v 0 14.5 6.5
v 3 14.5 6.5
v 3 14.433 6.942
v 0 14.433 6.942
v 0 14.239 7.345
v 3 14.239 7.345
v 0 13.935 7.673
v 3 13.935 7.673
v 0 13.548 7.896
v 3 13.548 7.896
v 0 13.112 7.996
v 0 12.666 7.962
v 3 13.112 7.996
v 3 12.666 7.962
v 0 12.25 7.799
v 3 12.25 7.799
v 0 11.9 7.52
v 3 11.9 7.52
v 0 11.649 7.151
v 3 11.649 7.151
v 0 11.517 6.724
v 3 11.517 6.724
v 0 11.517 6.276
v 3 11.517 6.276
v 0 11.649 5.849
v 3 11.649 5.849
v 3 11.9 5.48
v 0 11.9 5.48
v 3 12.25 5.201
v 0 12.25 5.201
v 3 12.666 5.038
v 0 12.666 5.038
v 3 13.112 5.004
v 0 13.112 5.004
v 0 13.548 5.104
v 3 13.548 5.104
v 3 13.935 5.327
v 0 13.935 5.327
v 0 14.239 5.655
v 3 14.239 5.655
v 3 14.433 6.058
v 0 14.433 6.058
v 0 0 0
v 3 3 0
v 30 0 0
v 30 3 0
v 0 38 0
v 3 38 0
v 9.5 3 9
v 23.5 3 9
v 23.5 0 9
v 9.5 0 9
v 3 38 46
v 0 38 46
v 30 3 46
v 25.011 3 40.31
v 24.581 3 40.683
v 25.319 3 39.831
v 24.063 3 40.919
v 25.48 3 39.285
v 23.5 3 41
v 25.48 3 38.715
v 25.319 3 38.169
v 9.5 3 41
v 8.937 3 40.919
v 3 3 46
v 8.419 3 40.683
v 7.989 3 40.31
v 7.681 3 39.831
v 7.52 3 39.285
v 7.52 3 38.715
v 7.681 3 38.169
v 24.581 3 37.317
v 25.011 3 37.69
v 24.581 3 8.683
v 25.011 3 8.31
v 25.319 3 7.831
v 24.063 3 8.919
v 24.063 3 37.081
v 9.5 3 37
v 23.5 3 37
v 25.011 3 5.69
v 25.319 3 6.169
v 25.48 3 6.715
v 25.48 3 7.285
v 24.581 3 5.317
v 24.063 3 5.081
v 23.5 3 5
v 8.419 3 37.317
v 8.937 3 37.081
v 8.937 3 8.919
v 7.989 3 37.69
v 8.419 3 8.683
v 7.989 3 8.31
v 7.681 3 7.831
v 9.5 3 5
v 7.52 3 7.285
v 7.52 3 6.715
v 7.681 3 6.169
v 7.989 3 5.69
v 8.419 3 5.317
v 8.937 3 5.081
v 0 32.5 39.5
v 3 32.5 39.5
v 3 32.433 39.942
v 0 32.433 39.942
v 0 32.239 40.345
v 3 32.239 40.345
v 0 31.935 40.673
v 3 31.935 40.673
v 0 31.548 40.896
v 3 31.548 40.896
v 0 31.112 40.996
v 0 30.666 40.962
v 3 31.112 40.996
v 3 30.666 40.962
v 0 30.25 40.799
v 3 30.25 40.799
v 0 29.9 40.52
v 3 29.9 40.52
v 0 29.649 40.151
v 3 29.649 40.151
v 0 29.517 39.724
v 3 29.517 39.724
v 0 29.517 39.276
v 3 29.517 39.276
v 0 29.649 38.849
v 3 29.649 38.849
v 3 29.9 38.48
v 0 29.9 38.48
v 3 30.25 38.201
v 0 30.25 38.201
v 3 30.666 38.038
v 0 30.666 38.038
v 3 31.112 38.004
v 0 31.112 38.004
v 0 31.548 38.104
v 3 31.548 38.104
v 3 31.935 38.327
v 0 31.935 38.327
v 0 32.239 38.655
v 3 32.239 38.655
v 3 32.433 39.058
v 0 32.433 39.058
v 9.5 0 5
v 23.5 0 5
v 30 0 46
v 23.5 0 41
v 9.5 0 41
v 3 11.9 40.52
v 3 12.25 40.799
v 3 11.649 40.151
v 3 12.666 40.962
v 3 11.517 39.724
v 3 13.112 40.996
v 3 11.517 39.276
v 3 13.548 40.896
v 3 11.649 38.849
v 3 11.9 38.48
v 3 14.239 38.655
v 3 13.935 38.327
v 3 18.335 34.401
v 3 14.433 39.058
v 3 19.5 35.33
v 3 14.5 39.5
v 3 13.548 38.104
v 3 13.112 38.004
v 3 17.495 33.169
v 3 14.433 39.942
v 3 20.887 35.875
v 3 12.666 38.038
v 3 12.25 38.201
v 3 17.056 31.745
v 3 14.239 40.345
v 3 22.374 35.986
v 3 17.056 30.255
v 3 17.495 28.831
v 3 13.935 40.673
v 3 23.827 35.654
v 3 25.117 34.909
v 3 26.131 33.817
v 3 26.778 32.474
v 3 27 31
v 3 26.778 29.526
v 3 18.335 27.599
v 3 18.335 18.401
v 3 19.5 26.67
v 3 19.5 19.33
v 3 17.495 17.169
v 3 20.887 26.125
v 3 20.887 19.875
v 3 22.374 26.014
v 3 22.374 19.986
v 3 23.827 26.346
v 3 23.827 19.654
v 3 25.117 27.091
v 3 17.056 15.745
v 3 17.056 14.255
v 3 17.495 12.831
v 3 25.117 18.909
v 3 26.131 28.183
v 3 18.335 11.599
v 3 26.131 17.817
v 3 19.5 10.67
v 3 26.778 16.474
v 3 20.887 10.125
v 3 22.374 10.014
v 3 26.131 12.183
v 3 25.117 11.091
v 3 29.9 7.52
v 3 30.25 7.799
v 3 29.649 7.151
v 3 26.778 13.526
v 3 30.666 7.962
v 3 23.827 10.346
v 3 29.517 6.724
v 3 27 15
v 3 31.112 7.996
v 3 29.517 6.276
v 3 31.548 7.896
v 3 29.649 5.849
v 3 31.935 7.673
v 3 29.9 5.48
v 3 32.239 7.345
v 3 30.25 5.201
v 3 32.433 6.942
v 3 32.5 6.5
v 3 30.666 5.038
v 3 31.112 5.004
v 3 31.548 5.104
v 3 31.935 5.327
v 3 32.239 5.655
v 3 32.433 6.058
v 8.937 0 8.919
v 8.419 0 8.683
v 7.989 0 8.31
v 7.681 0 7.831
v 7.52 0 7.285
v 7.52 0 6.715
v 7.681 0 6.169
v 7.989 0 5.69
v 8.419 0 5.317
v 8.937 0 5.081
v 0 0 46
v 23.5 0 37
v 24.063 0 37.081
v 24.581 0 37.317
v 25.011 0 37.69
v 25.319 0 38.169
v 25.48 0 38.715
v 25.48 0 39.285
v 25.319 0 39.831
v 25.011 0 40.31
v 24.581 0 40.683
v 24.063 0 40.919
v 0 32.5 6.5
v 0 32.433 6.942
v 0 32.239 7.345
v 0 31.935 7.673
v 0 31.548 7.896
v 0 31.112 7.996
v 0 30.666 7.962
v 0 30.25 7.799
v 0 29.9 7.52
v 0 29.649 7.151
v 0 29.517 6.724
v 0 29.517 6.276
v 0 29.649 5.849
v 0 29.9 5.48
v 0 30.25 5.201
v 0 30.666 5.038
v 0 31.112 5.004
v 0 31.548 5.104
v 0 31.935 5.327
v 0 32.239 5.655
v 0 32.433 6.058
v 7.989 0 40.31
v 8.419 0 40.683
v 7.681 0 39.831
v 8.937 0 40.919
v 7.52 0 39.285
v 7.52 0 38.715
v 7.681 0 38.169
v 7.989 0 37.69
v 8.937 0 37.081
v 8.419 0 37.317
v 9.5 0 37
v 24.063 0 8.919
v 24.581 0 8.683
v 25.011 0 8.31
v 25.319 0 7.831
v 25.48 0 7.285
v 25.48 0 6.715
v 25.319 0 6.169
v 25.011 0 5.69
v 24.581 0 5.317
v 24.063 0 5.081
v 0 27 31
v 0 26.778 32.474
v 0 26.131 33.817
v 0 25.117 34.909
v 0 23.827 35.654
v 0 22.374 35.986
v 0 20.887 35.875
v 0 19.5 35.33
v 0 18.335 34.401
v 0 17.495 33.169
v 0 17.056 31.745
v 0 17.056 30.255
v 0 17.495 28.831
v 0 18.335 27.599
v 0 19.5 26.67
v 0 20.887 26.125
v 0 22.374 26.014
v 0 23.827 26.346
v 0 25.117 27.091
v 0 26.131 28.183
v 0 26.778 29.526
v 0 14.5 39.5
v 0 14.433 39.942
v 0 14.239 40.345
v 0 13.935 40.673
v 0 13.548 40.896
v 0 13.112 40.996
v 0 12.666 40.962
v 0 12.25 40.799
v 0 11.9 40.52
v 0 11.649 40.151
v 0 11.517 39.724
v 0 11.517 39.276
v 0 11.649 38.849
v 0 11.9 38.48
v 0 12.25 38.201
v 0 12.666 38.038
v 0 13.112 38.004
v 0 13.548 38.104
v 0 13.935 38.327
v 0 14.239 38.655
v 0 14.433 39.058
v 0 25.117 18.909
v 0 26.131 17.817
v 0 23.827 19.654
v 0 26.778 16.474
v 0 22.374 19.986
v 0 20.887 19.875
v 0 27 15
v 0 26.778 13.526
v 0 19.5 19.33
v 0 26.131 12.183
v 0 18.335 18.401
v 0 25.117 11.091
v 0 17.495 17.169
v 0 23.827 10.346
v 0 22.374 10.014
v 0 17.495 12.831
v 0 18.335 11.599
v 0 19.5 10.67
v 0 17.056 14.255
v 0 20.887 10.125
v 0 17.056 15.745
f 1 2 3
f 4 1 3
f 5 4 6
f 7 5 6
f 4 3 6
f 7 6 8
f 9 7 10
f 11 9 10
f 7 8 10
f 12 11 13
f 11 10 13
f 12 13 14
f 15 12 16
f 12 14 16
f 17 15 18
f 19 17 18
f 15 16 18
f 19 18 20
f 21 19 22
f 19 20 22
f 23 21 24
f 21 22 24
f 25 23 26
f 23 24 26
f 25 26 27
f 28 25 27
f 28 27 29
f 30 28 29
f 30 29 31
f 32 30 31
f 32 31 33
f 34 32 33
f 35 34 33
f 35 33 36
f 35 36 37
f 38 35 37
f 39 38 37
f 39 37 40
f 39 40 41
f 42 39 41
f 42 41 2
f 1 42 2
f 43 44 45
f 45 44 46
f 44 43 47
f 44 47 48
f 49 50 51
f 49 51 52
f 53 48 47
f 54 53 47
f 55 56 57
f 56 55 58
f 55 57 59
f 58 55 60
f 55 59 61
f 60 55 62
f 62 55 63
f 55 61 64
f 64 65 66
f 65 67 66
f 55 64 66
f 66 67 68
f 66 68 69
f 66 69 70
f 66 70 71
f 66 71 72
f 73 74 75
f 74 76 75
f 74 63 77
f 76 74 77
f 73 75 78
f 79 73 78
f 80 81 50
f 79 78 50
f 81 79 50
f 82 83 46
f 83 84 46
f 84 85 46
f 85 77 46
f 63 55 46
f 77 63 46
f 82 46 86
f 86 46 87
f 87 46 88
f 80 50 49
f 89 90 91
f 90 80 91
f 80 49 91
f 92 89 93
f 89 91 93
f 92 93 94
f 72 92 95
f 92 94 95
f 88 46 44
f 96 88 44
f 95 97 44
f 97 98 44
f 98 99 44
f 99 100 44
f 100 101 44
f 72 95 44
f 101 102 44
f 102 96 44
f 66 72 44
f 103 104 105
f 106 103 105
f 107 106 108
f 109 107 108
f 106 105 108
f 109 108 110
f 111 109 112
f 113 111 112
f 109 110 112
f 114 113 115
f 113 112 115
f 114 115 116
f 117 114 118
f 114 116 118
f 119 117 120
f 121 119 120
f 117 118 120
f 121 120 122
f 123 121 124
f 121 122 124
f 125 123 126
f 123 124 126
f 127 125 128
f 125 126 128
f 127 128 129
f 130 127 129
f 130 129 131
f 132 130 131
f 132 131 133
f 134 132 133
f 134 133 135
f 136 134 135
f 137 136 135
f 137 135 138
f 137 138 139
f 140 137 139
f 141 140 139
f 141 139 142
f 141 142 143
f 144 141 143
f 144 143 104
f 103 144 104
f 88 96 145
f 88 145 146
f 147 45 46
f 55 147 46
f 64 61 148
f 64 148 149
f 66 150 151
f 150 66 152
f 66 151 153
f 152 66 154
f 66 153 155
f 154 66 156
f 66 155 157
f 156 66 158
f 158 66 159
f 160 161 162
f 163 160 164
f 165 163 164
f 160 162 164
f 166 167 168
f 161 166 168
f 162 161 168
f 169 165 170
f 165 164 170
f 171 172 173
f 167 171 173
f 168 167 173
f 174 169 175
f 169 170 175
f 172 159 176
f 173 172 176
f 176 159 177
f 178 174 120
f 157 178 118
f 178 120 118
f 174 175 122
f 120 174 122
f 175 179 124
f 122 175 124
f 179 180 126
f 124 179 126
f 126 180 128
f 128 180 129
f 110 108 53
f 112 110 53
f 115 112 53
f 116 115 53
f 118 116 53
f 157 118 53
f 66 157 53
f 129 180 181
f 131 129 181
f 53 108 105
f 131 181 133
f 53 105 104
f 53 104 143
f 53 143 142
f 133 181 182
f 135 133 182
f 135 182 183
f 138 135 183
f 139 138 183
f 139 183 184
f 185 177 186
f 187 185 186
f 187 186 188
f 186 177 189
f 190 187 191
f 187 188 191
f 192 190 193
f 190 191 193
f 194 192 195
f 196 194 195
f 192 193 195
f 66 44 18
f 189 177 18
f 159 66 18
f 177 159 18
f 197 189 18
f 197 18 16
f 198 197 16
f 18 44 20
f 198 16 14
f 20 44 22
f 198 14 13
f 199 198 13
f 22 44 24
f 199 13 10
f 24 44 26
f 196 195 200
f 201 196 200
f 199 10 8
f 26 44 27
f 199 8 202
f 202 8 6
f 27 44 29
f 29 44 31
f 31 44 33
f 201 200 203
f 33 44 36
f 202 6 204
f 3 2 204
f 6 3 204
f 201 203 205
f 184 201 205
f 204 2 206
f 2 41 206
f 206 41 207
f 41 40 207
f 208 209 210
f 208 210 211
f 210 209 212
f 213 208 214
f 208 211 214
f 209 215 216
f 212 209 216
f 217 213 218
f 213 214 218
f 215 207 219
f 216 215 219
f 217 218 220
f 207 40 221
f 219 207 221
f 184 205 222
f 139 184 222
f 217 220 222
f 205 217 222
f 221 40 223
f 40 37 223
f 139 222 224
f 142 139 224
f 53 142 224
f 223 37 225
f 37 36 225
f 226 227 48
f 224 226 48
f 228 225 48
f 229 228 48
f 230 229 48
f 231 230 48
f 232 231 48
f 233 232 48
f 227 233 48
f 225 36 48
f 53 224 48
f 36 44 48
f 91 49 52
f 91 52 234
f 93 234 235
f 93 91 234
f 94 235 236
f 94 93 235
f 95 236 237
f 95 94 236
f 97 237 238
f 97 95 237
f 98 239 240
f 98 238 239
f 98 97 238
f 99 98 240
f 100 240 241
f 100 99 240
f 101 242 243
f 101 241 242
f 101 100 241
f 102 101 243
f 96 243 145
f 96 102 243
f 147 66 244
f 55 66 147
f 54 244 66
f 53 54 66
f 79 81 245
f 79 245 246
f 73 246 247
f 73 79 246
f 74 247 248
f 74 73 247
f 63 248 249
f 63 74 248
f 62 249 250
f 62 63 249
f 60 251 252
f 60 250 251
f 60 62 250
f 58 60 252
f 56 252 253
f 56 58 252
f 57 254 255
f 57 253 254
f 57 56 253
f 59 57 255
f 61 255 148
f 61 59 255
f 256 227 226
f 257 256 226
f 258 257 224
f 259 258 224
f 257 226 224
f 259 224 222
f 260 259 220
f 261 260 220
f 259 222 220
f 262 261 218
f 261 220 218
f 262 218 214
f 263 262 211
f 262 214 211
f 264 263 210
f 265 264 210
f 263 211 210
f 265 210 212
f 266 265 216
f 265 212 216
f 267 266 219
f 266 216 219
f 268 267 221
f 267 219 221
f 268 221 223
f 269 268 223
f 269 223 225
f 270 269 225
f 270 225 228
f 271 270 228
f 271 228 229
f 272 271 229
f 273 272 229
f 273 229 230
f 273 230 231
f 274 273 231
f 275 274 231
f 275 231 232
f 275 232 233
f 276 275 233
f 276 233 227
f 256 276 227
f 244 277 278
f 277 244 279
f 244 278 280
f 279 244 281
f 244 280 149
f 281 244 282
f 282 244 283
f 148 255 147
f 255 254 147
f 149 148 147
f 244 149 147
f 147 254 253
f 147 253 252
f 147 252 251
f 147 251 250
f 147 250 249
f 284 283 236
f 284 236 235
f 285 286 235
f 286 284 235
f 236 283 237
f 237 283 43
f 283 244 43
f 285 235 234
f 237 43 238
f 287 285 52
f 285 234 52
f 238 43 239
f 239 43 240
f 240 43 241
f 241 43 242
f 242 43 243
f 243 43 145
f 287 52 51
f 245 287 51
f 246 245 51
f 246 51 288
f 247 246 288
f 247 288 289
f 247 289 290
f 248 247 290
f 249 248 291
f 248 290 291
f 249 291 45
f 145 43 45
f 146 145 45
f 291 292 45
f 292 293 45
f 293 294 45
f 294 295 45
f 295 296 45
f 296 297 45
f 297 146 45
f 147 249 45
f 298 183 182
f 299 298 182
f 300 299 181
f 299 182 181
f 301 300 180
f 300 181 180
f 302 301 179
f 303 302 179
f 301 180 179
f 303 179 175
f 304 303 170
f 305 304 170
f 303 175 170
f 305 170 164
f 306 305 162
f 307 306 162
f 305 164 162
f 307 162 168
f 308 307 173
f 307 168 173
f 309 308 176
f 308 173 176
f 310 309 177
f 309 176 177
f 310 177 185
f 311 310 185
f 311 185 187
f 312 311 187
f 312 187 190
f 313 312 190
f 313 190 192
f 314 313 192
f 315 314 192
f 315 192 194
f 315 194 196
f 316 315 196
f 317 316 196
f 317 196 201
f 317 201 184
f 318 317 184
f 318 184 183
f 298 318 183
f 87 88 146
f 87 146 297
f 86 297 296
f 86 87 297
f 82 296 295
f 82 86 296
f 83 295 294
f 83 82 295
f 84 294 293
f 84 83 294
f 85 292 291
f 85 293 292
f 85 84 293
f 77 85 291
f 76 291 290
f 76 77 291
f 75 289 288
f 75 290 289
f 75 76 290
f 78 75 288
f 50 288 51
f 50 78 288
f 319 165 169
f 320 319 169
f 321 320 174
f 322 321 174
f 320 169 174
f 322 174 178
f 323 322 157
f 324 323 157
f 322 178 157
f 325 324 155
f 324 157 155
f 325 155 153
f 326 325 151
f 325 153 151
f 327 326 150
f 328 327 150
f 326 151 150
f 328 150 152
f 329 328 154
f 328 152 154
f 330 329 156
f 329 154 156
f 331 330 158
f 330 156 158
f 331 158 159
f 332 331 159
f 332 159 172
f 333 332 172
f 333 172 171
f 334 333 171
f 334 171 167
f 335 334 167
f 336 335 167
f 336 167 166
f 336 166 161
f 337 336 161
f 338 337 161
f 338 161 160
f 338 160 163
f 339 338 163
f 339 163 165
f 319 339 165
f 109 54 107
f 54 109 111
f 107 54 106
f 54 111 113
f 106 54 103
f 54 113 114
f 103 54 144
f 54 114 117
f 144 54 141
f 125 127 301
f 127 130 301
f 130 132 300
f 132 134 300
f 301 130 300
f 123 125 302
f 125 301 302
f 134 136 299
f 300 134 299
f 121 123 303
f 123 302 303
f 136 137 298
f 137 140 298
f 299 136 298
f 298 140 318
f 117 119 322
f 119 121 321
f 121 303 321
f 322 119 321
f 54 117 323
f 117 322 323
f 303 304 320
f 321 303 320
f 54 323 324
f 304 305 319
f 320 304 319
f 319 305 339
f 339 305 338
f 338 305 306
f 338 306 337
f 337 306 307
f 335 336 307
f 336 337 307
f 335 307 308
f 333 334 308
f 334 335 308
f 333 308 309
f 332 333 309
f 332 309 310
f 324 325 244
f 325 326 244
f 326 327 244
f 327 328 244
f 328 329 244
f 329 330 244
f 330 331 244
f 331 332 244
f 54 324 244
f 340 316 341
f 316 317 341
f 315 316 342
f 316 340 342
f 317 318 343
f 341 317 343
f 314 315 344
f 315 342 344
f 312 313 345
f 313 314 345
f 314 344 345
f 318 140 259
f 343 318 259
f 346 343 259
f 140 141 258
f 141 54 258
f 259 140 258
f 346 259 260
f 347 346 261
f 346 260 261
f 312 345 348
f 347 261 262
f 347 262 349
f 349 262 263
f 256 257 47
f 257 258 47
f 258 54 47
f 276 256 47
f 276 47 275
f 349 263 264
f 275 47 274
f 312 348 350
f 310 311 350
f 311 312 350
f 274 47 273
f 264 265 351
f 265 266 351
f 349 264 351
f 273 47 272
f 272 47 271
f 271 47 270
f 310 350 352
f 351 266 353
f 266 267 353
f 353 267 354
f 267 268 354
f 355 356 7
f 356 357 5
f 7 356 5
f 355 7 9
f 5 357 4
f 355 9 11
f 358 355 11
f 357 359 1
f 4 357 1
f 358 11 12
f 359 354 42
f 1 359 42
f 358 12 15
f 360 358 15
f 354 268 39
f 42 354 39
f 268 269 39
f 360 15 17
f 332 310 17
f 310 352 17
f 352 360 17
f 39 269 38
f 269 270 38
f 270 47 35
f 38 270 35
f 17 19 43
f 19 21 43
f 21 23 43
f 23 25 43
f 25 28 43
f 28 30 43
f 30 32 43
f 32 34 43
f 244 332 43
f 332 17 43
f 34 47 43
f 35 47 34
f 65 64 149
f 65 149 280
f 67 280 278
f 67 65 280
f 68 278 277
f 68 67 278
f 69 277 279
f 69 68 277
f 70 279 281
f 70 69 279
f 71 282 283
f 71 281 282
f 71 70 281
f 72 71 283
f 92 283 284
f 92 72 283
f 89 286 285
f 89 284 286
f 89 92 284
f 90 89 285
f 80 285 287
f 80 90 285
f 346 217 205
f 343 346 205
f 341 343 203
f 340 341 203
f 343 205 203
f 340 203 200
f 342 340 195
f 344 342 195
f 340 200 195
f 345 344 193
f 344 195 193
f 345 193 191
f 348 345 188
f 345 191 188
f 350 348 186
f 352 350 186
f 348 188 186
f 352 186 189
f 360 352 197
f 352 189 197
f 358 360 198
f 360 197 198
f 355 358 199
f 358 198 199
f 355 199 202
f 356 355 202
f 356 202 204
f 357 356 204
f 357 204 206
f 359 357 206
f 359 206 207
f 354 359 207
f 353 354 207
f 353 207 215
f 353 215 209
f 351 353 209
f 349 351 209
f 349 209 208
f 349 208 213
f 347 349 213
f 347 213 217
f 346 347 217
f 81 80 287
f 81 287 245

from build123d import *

# Parameters (mm, degrees)
EXTRUDE_1_DEPTH     = 46
SKETCH_2_R          = 1.5
SKETCH_2_R_2        = 5
CUT_EXTRUDE_1_DEPTH = 56
CUT_EXTRUDE_2_DEPTH = 56


with BuildPart() as part:
    # 草图1 → 凸台-拉伸1 (new body)
    with BuildSketch(Plane.XY):
        Polygon((0, 0), (30, 0), (30, 3), (3, 3), (3, 38), (0, 38), align=None)
    extrude(amount=EXTRUDE_1_DEPTH)

    # 草图2 → 切除-拉伸1 (cut)
    with BuildSketch(Plane(origin=(3, 0, 0), x_dir=(0, 0, -1), z_dir=(1, 0, 0))):
        with Locations(Location((-39.5, 31, 0), (0, 0, 90))):
            Circle(SKETCH_2_R)
        with Locations(Location((-39.5, 13, 0), (0, 0, 90))):
            Circle(SKETCH_2_R)
        with Locations(Location((-6.5, 31, 0), (0, 0, 90))):
            Circle(SKETCH_2_R)
        with Locations(Location((-6.5, 13, 0), (0, 0, 90))):
            Circle(SKETCH_2_R)
        with Locations(Location((-31, 22, 0), (0, 0, 90))):
            Circle(SKETCH_2_R_2)
        with Locations(Location((-15, 22, 0), (0, 0, 90))):
            Circle(SKETCH_2_R_2)
    extrude(amount=-CUT_EXTRUDE_1_DEPTH, mode=Mode.SUBTRACT)

    # 草图3 → 切除-拉伸2 (cut)
    with BuildSketch(Plane(origin=(0, 3, 0), x_dir=(1, 0, 0), z_dir=(0, 1, 0))):
        with BuildLine():
            Line((9.5, -5), (23.5, -5))
            ThreePointArc((23.5, -5), (25.5, -7), (23.5, -9))
            Line((23.5, -9), (9.5, -9))
            ThreePointArc((9.5, -9), (7.5, -7), (9.5, -5))
        make_face()
        with BuildLine():
            Line((9.5, -37), (23.5, -37))
            ThreePointArc((23.5, -37), (25.5, -39), (23.5, -41))
            Line((23.5, -41), (9.5, -41))
            ThreePointArc((9.5, -41), (7.5, -39), (9.5, -37))
        make_face()
    extrude(amount=-CUT_EXTRUDE_2_DEPTH, mode=Mode.SUBTRACT)


solid = part.part
